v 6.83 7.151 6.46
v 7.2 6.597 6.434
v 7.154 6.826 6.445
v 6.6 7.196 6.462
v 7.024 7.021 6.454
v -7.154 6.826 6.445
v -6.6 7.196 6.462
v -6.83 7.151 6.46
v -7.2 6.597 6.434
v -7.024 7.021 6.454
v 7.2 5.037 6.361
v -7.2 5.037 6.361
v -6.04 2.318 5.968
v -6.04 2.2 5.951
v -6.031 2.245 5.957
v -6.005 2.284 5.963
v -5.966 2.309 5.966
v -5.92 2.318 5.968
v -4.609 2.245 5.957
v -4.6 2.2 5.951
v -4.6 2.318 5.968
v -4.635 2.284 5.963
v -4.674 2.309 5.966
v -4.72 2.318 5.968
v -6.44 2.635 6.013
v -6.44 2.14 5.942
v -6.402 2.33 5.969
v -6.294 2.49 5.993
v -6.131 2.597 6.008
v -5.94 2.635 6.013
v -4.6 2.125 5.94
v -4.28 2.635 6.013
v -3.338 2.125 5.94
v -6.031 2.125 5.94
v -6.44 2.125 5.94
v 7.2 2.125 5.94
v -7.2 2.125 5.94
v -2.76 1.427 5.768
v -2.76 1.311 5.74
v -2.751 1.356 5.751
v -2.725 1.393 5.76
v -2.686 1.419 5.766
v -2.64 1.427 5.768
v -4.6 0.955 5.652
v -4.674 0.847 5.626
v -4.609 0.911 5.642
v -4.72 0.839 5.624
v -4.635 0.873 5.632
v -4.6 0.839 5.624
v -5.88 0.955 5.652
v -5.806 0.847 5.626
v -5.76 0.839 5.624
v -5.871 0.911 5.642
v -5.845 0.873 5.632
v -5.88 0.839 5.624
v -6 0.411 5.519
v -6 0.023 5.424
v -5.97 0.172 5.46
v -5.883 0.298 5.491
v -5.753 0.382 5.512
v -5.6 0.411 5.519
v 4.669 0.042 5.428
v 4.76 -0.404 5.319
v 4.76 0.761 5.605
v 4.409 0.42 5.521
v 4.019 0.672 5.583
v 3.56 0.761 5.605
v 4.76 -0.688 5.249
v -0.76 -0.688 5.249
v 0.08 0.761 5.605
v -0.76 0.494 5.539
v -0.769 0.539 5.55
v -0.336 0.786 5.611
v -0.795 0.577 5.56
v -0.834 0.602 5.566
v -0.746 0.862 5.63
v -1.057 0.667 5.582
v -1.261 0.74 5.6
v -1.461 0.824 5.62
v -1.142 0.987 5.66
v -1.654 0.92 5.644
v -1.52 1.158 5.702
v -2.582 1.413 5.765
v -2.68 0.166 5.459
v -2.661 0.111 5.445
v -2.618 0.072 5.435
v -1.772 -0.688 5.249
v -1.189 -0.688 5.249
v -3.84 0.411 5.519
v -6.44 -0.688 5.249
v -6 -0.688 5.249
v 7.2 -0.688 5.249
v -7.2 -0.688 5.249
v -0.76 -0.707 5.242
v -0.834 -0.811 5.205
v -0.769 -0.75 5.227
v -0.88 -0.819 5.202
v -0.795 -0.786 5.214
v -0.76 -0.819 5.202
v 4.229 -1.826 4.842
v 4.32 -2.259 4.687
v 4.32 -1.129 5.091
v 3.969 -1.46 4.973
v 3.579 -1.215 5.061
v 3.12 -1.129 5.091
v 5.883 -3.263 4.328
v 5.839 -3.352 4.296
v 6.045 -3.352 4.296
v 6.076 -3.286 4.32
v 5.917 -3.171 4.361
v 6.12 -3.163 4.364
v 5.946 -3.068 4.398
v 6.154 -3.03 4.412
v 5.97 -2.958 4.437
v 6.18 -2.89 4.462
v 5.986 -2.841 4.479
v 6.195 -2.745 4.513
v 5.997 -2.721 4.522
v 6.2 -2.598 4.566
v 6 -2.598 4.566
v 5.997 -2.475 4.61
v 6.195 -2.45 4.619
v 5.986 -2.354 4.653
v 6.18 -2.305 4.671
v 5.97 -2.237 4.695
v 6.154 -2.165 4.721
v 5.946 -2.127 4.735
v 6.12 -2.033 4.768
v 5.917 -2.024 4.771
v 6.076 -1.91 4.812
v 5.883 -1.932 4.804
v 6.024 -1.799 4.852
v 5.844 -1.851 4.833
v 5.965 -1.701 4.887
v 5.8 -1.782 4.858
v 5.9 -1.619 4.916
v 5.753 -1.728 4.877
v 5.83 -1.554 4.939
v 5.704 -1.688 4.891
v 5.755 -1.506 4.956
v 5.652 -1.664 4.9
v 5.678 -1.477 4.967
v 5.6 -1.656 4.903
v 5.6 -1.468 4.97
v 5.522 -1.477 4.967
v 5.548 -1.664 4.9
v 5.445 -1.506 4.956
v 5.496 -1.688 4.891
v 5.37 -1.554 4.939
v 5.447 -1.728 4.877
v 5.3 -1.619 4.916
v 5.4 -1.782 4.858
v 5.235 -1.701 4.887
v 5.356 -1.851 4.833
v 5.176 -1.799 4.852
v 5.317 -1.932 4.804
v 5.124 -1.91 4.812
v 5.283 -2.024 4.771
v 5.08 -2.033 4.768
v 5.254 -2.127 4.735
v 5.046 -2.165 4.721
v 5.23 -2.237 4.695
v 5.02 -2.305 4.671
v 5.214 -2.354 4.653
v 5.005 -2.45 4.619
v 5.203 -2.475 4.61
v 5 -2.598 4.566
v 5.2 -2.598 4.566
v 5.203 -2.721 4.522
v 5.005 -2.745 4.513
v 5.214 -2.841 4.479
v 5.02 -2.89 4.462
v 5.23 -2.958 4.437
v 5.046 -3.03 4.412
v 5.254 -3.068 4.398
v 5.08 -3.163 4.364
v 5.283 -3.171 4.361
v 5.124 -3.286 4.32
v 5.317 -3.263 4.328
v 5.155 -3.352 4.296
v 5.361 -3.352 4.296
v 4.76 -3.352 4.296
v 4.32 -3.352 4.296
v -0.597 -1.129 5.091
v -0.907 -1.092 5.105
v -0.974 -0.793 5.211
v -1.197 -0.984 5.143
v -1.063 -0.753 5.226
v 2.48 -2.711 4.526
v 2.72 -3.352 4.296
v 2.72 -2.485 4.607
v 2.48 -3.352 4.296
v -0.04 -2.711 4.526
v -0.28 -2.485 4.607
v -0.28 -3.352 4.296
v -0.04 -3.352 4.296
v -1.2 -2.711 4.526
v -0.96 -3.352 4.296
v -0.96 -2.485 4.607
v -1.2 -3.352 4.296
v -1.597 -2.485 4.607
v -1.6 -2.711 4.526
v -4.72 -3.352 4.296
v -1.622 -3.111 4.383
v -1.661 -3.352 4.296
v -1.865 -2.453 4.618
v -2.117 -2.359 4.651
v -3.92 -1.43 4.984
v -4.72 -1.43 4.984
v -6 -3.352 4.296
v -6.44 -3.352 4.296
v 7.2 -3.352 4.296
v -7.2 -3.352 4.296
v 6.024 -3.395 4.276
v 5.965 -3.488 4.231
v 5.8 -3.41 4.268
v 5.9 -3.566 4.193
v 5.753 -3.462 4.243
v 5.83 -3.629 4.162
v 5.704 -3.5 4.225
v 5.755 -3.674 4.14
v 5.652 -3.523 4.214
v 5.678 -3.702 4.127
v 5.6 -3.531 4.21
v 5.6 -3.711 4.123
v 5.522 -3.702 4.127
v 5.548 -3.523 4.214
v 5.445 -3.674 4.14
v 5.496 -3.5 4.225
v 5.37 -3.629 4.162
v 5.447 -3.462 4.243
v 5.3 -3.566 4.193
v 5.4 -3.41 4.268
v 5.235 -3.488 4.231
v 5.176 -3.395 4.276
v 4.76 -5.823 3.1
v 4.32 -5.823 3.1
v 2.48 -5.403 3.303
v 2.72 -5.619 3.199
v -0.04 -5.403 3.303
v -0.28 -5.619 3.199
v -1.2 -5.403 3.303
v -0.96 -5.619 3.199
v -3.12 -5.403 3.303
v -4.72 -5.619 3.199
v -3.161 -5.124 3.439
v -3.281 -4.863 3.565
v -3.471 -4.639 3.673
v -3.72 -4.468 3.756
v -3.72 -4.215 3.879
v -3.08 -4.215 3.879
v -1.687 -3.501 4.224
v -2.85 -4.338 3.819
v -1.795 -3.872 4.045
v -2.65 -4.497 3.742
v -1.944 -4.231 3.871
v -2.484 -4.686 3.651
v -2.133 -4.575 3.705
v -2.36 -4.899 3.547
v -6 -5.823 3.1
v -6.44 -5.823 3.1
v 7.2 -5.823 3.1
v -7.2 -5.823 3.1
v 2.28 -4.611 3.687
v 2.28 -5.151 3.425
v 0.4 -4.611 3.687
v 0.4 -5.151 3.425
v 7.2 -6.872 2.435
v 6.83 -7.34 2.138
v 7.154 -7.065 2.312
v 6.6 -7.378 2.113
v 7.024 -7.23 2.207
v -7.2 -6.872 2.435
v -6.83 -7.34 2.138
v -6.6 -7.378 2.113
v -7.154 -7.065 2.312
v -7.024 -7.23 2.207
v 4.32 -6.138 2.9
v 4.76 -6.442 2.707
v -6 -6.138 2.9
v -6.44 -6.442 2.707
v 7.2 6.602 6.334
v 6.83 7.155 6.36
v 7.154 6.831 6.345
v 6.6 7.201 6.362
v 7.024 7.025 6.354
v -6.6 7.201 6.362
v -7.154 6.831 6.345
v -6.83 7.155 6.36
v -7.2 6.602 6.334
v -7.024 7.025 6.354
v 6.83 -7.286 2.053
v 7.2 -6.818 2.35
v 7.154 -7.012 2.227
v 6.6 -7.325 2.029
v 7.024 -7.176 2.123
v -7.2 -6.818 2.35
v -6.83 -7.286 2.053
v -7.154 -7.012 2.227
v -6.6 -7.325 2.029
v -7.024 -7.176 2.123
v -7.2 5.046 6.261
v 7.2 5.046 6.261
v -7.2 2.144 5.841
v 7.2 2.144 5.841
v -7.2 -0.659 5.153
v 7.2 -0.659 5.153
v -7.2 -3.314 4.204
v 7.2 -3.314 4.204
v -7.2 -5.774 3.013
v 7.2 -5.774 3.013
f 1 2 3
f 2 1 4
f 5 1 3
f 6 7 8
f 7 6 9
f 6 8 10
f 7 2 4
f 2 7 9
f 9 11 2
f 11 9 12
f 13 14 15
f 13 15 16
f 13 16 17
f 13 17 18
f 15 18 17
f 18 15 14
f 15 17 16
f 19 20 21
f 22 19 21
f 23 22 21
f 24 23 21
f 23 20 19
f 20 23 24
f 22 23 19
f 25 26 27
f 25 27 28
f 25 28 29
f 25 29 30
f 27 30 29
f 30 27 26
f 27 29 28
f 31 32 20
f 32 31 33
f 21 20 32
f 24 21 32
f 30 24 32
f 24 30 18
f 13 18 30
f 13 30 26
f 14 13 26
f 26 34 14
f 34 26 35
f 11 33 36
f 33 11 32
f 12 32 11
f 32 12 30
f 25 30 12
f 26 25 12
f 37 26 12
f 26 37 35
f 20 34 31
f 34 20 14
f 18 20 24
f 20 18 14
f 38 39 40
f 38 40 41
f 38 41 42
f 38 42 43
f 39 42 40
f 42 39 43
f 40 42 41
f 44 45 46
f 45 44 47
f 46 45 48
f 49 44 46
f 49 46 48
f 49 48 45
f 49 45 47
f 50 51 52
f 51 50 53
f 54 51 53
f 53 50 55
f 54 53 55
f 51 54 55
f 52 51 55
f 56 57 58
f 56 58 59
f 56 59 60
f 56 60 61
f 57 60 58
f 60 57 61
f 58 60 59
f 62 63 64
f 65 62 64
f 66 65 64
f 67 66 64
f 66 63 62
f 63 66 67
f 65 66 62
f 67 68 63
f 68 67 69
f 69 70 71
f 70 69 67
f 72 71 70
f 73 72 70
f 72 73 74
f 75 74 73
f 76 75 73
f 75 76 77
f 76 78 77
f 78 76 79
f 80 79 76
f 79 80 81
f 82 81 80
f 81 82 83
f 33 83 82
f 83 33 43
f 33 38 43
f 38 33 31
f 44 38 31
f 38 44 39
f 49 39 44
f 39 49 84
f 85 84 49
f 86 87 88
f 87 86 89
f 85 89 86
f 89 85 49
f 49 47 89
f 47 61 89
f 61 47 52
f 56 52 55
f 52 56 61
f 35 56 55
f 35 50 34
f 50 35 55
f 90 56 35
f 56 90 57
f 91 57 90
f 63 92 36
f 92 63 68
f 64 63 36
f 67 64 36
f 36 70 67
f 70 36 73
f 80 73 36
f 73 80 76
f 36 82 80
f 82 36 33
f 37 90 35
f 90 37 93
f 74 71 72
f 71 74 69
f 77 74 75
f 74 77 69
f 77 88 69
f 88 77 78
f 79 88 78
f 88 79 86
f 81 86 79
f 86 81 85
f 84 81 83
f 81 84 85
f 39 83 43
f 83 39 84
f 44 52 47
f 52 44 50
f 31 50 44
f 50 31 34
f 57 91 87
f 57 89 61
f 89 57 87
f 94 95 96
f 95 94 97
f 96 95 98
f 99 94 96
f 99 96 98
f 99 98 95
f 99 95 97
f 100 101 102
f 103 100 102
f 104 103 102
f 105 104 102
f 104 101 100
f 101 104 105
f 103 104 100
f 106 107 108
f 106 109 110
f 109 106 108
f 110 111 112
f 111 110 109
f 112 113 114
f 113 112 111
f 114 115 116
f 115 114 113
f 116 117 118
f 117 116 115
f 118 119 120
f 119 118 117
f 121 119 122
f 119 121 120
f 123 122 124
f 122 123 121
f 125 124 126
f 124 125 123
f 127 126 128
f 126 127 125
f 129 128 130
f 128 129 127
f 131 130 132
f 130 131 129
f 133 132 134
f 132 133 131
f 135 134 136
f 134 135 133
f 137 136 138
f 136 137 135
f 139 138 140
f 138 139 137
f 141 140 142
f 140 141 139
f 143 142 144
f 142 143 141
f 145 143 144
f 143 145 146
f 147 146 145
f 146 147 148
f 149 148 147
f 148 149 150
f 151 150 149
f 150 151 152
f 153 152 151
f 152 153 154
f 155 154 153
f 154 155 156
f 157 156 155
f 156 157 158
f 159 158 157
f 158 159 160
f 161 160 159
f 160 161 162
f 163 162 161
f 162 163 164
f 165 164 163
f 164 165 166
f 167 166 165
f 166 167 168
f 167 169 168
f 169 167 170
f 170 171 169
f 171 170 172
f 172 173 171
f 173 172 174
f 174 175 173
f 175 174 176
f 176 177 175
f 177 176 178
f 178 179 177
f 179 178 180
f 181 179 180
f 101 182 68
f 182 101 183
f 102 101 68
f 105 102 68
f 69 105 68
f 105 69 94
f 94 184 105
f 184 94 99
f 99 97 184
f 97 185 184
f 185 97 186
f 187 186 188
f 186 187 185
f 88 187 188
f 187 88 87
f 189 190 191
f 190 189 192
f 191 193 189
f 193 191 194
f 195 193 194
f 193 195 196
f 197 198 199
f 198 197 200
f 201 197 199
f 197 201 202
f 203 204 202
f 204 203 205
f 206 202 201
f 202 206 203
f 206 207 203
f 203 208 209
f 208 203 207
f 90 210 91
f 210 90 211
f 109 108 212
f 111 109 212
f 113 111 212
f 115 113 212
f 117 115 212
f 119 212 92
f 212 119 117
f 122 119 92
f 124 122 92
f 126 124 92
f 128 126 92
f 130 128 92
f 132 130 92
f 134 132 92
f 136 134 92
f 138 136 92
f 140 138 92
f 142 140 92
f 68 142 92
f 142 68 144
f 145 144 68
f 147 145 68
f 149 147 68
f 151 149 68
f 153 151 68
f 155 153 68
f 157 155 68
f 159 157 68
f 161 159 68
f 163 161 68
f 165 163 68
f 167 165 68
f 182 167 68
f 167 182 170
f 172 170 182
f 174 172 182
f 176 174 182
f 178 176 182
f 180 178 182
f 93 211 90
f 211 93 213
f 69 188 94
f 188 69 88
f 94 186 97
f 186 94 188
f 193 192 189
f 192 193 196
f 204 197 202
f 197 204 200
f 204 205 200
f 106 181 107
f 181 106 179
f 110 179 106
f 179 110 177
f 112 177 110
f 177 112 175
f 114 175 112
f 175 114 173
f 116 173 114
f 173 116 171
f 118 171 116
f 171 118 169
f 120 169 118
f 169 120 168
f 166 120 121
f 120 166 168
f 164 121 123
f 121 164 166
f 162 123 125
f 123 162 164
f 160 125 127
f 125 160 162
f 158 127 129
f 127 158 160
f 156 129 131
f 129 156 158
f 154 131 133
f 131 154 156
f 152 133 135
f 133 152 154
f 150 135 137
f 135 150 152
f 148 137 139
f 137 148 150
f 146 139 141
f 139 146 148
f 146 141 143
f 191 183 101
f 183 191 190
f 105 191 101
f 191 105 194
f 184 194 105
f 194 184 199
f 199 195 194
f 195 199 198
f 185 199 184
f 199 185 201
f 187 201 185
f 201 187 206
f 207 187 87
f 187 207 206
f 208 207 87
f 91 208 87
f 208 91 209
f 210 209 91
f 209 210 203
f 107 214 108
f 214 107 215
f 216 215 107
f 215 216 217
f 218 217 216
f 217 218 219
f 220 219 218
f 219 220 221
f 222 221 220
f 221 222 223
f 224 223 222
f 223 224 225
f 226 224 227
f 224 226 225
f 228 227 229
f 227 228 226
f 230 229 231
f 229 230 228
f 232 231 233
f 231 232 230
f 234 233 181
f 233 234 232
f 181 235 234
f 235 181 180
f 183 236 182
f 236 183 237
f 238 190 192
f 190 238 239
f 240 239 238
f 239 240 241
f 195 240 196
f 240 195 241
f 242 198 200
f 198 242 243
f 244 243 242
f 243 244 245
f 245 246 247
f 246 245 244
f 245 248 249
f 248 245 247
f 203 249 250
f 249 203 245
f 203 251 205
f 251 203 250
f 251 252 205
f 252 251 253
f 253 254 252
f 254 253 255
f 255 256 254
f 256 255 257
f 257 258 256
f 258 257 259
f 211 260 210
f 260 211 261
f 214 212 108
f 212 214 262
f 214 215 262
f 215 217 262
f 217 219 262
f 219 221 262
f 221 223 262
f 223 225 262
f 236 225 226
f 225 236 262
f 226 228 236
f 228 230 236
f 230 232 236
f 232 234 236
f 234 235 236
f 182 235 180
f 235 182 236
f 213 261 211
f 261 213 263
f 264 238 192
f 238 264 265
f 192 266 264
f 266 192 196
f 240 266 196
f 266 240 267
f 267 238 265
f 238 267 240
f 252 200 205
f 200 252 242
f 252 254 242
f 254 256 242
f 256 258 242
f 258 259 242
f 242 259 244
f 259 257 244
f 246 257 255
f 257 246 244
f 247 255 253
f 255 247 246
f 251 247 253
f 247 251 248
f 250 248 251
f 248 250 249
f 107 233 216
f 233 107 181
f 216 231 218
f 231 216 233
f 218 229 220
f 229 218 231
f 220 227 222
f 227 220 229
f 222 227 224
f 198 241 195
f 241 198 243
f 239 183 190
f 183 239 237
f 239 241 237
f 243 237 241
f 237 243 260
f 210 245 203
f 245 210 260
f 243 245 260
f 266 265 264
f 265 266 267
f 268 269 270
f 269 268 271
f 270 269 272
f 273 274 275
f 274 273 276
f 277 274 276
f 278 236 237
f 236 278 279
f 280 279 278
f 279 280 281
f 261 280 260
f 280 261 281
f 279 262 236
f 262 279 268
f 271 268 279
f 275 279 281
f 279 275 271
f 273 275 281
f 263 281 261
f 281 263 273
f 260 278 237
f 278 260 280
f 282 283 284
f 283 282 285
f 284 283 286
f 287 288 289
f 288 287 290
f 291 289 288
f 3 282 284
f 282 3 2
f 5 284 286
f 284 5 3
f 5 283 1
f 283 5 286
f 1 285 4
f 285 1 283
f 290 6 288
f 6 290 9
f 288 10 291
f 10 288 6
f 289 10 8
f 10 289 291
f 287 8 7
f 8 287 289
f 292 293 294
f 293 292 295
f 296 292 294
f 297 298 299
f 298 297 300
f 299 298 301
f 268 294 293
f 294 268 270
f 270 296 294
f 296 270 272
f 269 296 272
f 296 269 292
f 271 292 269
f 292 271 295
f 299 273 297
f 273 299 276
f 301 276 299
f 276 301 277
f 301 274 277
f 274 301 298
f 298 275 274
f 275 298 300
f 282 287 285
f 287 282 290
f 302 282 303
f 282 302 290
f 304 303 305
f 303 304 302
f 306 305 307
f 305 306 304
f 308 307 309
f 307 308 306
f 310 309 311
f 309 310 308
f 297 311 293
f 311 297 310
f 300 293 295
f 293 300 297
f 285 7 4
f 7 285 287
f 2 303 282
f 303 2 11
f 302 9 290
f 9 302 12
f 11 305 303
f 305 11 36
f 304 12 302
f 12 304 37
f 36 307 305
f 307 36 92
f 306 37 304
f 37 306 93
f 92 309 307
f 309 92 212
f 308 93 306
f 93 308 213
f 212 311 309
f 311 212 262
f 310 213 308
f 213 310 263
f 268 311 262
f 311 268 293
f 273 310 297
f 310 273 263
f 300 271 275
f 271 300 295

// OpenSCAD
use <../lib.scad>
use <6141875rc01.scad>
function ldraw_lib__6141875sc01() = [
// 0 Sticker  1.9 x  1.8 with Taillamp on Blue Background Right (Formed)
// 0 Name: 6141875sc01.dat
// 0 Author: Massimo Maso [Sirio]
// 0 !LDRAW_ORG Part UPDATE 2023-04
// 0 !LICENSE Licensed under CC BY 4.0 : see CAreadme.txt
// 
// 0 BFC CERTIFY CCW
  [0,"BFC","CERTIFY"],
  [0,"BFC","CCW"],
// 
// 0 !KEYWORDS Bricklink 75875stk01, Brickowl 53567, F-150, Ford, Raptor
// 0 !KEYWORDS Rebrickable 24760, Set 75875, Speed Champions
// 
// 0 !HISTORY 2023-08-25 [OrionP] Official Update 2023-04
// 
// 
// 1 16 0 0 0 -1 0 0 0 1 0 0 0 1 6141875rc01.dat
  [1,16,0,0,0,-1,0,0,0,1,0,0,0,1, ldraw_lib__6141875rc01()],
];
module ldraw_lib__6141875sc01(step=0, col=false, unit=2/5, alt=false, line=0.2, solid=!$preview)
    makepoly(ldraw_lib__6141875sc01(), step=step, col=col, unit=unit, alt=alt, line=line, solid=solid);
ldraw_lib__6141875sc01(line=0.2);
